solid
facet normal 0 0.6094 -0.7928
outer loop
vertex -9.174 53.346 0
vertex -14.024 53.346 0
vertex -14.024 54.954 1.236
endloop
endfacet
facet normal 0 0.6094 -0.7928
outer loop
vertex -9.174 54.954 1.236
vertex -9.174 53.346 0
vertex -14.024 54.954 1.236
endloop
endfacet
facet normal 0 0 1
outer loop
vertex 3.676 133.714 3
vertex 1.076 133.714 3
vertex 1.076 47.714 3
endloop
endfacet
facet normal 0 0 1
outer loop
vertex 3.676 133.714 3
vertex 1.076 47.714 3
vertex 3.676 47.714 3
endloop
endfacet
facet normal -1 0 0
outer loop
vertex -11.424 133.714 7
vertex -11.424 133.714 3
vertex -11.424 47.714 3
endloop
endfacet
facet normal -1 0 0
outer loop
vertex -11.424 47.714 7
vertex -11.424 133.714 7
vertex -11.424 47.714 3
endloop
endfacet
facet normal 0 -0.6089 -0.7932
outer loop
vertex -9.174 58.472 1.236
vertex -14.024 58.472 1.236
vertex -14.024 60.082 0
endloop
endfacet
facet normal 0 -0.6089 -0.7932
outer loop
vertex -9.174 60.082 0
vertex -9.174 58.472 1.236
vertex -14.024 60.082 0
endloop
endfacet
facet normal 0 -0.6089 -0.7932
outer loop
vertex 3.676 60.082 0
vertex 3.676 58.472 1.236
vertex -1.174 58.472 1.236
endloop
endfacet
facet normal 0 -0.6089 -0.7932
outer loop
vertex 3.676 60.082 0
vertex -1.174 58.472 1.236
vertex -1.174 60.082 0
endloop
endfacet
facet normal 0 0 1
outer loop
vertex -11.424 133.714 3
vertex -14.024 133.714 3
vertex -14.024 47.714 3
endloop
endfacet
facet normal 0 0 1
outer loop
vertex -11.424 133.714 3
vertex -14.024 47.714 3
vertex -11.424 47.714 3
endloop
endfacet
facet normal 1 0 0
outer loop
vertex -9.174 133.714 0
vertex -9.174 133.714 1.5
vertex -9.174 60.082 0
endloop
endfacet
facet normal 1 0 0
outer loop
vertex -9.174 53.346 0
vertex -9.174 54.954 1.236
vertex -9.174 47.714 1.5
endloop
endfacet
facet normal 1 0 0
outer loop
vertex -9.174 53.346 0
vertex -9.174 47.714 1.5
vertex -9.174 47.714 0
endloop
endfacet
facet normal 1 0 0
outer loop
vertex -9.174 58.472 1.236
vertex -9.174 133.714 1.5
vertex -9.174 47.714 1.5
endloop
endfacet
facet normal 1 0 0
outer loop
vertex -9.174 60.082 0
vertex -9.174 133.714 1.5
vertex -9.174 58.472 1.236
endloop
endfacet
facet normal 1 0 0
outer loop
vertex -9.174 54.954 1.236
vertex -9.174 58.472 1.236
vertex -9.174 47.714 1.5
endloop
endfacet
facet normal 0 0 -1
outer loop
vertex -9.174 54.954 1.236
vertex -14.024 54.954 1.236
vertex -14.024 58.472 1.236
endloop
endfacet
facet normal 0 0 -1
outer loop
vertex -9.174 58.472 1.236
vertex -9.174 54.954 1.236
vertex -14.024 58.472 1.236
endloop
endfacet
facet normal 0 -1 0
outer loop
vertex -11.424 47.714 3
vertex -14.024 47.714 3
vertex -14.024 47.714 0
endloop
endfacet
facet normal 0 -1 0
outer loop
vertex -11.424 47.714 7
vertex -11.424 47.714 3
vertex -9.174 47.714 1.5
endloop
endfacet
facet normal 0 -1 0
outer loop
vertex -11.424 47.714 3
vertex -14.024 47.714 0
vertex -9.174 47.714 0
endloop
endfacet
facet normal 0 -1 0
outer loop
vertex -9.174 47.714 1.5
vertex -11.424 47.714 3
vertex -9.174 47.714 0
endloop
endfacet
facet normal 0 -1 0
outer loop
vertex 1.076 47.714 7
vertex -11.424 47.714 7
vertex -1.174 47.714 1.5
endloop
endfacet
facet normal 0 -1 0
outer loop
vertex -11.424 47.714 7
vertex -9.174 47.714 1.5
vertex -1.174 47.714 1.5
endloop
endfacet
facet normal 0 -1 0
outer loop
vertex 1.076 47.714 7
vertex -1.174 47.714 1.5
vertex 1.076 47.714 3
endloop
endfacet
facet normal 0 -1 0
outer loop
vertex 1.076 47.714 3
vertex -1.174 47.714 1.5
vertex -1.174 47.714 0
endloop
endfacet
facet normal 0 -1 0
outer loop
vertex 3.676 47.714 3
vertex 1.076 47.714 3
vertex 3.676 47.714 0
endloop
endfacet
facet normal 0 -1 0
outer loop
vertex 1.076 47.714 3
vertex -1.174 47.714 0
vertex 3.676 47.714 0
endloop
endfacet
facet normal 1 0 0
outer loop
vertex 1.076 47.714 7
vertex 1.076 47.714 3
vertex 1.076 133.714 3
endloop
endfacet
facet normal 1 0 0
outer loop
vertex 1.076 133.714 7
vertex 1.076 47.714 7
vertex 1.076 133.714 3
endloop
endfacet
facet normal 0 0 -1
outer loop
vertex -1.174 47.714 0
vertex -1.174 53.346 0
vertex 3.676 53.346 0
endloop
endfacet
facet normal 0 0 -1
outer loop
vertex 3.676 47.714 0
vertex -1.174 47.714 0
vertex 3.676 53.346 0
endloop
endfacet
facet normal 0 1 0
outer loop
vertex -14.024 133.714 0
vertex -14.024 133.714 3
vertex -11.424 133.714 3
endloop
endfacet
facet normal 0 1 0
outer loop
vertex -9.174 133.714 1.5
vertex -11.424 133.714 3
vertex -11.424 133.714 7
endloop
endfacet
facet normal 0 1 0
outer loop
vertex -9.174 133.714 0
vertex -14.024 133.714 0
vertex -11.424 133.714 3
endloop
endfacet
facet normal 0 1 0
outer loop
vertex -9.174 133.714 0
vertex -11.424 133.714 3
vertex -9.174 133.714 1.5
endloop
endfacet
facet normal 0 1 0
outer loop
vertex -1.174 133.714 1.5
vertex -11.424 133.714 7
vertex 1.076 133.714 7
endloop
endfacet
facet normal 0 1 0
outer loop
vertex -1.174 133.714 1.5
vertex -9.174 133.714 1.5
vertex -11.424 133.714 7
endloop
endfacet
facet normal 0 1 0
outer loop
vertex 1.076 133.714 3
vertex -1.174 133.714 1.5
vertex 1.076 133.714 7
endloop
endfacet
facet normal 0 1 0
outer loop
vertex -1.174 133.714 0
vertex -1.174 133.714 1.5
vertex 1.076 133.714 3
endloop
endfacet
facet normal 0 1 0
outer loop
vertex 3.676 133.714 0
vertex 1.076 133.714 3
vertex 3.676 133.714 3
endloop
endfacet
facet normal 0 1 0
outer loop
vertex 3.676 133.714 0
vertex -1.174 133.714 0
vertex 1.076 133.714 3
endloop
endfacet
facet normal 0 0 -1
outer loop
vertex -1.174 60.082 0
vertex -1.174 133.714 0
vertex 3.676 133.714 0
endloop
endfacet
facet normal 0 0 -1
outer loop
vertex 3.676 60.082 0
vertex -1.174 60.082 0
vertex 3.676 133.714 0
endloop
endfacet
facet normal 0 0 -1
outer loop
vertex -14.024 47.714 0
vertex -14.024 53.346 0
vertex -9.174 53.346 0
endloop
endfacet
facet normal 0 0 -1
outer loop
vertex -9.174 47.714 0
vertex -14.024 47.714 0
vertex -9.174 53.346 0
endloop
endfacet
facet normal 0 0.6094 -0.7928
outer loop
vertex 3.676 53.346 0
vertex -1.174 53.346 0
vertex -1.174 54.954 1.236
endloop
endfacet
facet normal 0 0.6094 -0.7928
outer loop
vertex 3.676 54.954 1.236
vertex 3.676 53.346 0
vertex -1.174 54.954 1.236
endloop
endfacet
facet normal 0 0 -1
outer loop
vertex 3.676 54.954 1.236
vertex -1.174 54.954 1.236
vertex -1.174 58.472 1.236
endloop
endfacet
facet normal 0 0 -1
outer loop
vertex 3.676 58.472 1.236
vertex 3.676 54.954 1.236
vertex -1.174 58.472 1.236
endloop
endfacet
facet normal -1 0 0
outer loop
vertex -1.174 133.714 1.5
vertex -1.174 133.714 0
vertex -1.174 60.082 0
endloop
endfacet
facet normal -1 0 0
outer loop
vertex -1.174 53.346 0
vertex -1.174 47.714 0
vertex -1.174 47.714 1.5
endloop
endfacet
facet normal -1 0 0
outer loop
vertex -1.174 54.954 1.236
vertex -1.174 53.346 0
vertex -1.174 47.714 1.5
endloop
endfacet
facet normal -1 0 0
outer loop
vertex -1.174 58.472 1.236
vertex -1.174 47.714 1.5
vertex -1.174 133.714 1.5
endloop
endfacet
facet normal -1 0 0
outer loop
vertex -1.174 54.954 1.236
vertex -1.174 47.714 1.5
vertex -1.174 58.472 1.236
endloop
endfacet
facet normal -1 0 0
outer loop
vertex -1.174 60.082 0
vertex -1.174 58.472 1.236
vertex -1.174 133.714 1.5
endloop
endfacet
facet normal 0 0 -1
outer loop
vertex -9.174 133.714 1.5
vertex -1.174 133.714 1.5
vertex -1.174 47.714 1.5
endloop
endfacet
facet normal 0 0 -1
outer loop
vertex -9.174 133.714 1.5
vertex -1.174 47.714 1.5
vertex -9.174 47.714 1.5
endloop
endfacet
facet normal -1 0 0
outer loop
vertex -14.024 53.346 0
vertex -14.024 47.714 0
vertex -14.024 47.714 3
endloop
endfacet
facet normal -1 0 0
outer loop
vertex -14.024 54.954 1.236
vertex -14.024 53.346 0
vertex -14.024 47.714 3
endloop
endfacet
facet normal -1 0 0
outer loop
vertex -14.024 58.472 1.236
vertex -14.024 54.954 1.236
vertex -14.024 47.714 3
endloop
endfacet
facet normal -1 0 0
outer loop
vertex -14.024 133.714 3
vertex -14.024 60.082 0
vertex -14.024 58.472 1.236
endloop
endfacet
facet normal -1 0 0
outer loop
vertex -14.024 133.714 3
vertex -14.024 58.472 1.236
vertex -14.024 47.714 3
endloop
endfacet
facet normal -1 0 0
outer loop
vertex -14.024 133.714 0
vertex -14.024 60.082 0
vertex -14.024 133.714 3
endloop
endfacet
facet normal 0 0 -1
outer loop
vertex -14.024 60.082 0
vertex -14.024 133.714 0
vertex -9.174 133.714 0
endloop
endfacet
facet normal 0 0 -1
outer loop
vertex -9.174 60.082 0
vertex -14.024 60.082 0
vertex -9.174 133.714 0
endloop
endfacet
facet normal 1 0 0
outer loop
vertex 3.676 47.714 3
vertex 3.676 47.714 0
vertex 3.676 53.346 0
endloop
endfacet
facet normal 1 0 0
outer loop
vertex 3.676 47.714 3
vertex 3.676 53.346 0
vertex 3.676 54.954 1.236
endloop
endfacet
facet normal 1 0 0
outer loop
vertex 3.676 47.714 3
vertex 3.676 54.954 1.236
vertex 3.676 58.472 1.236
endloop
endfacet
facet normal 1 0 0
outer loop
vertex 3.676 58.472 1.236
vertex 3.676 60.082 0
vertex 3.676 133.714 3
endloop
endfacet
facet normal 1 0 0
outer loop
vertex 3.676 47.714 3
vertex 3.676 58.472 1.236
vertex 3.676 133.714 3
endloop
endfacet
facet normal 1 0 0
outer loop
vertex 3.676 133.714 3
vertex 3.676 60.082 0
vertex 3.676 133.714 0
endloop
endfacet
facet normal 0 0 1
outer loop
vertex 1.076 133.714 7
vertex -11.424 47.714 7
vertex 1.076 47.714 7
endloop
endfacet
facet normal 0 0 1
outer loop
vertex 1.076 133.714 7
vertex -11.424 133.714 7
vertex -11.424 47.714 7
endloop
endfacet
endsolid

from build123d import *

# Parameters (mm, degrees)
F0_W     = 17.7
F0_H     = 86
F1_DEPTH = 3
F3_DEPTH = 4
F5_DEPTH = 86
F7_DEPTH = 25


with BuildPart() as f1:
    # F0 (on Top) → F1 (new body)
    with BuildSketch(Plane.XY):
        with Locations((-5.174149, 90.714084)):
            Rectangle(F0_W, F0_H)
    extrude(amount=F1_DEPTH)

    # F2 (on face) → F3 (join)
    with BuildSketch(Plane.XY.offset(3)):
        Polygon((-11.424149, 47.714084), (-5.174149, 47.714084), (1.075851, 47.714084), (1.075851, 133.714084), (-11.424149, 133.714084), align=None)
    extrude(amount=F3_DEPTH)

    # F4 (on face) → F5 (cut)
    with BuildSketch(Plane.XZ.offset(-47.714084)):
        Polygon((-9.174149, 0), (-5.174149, 0), (-1.174149, 0), (-1.174149, 1.5), (-9.174149, 1.5), align=None)
    extrude(amount=-F5_DEPTH, mode=Mode.SUBTRACT)

    # F6 (on face) → F7 (cut)
    with BuildSketch(Plane(origin=(-14.024149, 0, 0), x_dir=(0, -1, 0), z_dir=(-1, 0, 0))):
        Polygon((-60.08194, 0), (-53.346284, 0), (-54.954443, 1.236051), (-58.471706, 1.236051), align=None)
    extrude(amount=-F7_DEPTH, mode=Mode.SUBTRACT)


solid = f1.part
